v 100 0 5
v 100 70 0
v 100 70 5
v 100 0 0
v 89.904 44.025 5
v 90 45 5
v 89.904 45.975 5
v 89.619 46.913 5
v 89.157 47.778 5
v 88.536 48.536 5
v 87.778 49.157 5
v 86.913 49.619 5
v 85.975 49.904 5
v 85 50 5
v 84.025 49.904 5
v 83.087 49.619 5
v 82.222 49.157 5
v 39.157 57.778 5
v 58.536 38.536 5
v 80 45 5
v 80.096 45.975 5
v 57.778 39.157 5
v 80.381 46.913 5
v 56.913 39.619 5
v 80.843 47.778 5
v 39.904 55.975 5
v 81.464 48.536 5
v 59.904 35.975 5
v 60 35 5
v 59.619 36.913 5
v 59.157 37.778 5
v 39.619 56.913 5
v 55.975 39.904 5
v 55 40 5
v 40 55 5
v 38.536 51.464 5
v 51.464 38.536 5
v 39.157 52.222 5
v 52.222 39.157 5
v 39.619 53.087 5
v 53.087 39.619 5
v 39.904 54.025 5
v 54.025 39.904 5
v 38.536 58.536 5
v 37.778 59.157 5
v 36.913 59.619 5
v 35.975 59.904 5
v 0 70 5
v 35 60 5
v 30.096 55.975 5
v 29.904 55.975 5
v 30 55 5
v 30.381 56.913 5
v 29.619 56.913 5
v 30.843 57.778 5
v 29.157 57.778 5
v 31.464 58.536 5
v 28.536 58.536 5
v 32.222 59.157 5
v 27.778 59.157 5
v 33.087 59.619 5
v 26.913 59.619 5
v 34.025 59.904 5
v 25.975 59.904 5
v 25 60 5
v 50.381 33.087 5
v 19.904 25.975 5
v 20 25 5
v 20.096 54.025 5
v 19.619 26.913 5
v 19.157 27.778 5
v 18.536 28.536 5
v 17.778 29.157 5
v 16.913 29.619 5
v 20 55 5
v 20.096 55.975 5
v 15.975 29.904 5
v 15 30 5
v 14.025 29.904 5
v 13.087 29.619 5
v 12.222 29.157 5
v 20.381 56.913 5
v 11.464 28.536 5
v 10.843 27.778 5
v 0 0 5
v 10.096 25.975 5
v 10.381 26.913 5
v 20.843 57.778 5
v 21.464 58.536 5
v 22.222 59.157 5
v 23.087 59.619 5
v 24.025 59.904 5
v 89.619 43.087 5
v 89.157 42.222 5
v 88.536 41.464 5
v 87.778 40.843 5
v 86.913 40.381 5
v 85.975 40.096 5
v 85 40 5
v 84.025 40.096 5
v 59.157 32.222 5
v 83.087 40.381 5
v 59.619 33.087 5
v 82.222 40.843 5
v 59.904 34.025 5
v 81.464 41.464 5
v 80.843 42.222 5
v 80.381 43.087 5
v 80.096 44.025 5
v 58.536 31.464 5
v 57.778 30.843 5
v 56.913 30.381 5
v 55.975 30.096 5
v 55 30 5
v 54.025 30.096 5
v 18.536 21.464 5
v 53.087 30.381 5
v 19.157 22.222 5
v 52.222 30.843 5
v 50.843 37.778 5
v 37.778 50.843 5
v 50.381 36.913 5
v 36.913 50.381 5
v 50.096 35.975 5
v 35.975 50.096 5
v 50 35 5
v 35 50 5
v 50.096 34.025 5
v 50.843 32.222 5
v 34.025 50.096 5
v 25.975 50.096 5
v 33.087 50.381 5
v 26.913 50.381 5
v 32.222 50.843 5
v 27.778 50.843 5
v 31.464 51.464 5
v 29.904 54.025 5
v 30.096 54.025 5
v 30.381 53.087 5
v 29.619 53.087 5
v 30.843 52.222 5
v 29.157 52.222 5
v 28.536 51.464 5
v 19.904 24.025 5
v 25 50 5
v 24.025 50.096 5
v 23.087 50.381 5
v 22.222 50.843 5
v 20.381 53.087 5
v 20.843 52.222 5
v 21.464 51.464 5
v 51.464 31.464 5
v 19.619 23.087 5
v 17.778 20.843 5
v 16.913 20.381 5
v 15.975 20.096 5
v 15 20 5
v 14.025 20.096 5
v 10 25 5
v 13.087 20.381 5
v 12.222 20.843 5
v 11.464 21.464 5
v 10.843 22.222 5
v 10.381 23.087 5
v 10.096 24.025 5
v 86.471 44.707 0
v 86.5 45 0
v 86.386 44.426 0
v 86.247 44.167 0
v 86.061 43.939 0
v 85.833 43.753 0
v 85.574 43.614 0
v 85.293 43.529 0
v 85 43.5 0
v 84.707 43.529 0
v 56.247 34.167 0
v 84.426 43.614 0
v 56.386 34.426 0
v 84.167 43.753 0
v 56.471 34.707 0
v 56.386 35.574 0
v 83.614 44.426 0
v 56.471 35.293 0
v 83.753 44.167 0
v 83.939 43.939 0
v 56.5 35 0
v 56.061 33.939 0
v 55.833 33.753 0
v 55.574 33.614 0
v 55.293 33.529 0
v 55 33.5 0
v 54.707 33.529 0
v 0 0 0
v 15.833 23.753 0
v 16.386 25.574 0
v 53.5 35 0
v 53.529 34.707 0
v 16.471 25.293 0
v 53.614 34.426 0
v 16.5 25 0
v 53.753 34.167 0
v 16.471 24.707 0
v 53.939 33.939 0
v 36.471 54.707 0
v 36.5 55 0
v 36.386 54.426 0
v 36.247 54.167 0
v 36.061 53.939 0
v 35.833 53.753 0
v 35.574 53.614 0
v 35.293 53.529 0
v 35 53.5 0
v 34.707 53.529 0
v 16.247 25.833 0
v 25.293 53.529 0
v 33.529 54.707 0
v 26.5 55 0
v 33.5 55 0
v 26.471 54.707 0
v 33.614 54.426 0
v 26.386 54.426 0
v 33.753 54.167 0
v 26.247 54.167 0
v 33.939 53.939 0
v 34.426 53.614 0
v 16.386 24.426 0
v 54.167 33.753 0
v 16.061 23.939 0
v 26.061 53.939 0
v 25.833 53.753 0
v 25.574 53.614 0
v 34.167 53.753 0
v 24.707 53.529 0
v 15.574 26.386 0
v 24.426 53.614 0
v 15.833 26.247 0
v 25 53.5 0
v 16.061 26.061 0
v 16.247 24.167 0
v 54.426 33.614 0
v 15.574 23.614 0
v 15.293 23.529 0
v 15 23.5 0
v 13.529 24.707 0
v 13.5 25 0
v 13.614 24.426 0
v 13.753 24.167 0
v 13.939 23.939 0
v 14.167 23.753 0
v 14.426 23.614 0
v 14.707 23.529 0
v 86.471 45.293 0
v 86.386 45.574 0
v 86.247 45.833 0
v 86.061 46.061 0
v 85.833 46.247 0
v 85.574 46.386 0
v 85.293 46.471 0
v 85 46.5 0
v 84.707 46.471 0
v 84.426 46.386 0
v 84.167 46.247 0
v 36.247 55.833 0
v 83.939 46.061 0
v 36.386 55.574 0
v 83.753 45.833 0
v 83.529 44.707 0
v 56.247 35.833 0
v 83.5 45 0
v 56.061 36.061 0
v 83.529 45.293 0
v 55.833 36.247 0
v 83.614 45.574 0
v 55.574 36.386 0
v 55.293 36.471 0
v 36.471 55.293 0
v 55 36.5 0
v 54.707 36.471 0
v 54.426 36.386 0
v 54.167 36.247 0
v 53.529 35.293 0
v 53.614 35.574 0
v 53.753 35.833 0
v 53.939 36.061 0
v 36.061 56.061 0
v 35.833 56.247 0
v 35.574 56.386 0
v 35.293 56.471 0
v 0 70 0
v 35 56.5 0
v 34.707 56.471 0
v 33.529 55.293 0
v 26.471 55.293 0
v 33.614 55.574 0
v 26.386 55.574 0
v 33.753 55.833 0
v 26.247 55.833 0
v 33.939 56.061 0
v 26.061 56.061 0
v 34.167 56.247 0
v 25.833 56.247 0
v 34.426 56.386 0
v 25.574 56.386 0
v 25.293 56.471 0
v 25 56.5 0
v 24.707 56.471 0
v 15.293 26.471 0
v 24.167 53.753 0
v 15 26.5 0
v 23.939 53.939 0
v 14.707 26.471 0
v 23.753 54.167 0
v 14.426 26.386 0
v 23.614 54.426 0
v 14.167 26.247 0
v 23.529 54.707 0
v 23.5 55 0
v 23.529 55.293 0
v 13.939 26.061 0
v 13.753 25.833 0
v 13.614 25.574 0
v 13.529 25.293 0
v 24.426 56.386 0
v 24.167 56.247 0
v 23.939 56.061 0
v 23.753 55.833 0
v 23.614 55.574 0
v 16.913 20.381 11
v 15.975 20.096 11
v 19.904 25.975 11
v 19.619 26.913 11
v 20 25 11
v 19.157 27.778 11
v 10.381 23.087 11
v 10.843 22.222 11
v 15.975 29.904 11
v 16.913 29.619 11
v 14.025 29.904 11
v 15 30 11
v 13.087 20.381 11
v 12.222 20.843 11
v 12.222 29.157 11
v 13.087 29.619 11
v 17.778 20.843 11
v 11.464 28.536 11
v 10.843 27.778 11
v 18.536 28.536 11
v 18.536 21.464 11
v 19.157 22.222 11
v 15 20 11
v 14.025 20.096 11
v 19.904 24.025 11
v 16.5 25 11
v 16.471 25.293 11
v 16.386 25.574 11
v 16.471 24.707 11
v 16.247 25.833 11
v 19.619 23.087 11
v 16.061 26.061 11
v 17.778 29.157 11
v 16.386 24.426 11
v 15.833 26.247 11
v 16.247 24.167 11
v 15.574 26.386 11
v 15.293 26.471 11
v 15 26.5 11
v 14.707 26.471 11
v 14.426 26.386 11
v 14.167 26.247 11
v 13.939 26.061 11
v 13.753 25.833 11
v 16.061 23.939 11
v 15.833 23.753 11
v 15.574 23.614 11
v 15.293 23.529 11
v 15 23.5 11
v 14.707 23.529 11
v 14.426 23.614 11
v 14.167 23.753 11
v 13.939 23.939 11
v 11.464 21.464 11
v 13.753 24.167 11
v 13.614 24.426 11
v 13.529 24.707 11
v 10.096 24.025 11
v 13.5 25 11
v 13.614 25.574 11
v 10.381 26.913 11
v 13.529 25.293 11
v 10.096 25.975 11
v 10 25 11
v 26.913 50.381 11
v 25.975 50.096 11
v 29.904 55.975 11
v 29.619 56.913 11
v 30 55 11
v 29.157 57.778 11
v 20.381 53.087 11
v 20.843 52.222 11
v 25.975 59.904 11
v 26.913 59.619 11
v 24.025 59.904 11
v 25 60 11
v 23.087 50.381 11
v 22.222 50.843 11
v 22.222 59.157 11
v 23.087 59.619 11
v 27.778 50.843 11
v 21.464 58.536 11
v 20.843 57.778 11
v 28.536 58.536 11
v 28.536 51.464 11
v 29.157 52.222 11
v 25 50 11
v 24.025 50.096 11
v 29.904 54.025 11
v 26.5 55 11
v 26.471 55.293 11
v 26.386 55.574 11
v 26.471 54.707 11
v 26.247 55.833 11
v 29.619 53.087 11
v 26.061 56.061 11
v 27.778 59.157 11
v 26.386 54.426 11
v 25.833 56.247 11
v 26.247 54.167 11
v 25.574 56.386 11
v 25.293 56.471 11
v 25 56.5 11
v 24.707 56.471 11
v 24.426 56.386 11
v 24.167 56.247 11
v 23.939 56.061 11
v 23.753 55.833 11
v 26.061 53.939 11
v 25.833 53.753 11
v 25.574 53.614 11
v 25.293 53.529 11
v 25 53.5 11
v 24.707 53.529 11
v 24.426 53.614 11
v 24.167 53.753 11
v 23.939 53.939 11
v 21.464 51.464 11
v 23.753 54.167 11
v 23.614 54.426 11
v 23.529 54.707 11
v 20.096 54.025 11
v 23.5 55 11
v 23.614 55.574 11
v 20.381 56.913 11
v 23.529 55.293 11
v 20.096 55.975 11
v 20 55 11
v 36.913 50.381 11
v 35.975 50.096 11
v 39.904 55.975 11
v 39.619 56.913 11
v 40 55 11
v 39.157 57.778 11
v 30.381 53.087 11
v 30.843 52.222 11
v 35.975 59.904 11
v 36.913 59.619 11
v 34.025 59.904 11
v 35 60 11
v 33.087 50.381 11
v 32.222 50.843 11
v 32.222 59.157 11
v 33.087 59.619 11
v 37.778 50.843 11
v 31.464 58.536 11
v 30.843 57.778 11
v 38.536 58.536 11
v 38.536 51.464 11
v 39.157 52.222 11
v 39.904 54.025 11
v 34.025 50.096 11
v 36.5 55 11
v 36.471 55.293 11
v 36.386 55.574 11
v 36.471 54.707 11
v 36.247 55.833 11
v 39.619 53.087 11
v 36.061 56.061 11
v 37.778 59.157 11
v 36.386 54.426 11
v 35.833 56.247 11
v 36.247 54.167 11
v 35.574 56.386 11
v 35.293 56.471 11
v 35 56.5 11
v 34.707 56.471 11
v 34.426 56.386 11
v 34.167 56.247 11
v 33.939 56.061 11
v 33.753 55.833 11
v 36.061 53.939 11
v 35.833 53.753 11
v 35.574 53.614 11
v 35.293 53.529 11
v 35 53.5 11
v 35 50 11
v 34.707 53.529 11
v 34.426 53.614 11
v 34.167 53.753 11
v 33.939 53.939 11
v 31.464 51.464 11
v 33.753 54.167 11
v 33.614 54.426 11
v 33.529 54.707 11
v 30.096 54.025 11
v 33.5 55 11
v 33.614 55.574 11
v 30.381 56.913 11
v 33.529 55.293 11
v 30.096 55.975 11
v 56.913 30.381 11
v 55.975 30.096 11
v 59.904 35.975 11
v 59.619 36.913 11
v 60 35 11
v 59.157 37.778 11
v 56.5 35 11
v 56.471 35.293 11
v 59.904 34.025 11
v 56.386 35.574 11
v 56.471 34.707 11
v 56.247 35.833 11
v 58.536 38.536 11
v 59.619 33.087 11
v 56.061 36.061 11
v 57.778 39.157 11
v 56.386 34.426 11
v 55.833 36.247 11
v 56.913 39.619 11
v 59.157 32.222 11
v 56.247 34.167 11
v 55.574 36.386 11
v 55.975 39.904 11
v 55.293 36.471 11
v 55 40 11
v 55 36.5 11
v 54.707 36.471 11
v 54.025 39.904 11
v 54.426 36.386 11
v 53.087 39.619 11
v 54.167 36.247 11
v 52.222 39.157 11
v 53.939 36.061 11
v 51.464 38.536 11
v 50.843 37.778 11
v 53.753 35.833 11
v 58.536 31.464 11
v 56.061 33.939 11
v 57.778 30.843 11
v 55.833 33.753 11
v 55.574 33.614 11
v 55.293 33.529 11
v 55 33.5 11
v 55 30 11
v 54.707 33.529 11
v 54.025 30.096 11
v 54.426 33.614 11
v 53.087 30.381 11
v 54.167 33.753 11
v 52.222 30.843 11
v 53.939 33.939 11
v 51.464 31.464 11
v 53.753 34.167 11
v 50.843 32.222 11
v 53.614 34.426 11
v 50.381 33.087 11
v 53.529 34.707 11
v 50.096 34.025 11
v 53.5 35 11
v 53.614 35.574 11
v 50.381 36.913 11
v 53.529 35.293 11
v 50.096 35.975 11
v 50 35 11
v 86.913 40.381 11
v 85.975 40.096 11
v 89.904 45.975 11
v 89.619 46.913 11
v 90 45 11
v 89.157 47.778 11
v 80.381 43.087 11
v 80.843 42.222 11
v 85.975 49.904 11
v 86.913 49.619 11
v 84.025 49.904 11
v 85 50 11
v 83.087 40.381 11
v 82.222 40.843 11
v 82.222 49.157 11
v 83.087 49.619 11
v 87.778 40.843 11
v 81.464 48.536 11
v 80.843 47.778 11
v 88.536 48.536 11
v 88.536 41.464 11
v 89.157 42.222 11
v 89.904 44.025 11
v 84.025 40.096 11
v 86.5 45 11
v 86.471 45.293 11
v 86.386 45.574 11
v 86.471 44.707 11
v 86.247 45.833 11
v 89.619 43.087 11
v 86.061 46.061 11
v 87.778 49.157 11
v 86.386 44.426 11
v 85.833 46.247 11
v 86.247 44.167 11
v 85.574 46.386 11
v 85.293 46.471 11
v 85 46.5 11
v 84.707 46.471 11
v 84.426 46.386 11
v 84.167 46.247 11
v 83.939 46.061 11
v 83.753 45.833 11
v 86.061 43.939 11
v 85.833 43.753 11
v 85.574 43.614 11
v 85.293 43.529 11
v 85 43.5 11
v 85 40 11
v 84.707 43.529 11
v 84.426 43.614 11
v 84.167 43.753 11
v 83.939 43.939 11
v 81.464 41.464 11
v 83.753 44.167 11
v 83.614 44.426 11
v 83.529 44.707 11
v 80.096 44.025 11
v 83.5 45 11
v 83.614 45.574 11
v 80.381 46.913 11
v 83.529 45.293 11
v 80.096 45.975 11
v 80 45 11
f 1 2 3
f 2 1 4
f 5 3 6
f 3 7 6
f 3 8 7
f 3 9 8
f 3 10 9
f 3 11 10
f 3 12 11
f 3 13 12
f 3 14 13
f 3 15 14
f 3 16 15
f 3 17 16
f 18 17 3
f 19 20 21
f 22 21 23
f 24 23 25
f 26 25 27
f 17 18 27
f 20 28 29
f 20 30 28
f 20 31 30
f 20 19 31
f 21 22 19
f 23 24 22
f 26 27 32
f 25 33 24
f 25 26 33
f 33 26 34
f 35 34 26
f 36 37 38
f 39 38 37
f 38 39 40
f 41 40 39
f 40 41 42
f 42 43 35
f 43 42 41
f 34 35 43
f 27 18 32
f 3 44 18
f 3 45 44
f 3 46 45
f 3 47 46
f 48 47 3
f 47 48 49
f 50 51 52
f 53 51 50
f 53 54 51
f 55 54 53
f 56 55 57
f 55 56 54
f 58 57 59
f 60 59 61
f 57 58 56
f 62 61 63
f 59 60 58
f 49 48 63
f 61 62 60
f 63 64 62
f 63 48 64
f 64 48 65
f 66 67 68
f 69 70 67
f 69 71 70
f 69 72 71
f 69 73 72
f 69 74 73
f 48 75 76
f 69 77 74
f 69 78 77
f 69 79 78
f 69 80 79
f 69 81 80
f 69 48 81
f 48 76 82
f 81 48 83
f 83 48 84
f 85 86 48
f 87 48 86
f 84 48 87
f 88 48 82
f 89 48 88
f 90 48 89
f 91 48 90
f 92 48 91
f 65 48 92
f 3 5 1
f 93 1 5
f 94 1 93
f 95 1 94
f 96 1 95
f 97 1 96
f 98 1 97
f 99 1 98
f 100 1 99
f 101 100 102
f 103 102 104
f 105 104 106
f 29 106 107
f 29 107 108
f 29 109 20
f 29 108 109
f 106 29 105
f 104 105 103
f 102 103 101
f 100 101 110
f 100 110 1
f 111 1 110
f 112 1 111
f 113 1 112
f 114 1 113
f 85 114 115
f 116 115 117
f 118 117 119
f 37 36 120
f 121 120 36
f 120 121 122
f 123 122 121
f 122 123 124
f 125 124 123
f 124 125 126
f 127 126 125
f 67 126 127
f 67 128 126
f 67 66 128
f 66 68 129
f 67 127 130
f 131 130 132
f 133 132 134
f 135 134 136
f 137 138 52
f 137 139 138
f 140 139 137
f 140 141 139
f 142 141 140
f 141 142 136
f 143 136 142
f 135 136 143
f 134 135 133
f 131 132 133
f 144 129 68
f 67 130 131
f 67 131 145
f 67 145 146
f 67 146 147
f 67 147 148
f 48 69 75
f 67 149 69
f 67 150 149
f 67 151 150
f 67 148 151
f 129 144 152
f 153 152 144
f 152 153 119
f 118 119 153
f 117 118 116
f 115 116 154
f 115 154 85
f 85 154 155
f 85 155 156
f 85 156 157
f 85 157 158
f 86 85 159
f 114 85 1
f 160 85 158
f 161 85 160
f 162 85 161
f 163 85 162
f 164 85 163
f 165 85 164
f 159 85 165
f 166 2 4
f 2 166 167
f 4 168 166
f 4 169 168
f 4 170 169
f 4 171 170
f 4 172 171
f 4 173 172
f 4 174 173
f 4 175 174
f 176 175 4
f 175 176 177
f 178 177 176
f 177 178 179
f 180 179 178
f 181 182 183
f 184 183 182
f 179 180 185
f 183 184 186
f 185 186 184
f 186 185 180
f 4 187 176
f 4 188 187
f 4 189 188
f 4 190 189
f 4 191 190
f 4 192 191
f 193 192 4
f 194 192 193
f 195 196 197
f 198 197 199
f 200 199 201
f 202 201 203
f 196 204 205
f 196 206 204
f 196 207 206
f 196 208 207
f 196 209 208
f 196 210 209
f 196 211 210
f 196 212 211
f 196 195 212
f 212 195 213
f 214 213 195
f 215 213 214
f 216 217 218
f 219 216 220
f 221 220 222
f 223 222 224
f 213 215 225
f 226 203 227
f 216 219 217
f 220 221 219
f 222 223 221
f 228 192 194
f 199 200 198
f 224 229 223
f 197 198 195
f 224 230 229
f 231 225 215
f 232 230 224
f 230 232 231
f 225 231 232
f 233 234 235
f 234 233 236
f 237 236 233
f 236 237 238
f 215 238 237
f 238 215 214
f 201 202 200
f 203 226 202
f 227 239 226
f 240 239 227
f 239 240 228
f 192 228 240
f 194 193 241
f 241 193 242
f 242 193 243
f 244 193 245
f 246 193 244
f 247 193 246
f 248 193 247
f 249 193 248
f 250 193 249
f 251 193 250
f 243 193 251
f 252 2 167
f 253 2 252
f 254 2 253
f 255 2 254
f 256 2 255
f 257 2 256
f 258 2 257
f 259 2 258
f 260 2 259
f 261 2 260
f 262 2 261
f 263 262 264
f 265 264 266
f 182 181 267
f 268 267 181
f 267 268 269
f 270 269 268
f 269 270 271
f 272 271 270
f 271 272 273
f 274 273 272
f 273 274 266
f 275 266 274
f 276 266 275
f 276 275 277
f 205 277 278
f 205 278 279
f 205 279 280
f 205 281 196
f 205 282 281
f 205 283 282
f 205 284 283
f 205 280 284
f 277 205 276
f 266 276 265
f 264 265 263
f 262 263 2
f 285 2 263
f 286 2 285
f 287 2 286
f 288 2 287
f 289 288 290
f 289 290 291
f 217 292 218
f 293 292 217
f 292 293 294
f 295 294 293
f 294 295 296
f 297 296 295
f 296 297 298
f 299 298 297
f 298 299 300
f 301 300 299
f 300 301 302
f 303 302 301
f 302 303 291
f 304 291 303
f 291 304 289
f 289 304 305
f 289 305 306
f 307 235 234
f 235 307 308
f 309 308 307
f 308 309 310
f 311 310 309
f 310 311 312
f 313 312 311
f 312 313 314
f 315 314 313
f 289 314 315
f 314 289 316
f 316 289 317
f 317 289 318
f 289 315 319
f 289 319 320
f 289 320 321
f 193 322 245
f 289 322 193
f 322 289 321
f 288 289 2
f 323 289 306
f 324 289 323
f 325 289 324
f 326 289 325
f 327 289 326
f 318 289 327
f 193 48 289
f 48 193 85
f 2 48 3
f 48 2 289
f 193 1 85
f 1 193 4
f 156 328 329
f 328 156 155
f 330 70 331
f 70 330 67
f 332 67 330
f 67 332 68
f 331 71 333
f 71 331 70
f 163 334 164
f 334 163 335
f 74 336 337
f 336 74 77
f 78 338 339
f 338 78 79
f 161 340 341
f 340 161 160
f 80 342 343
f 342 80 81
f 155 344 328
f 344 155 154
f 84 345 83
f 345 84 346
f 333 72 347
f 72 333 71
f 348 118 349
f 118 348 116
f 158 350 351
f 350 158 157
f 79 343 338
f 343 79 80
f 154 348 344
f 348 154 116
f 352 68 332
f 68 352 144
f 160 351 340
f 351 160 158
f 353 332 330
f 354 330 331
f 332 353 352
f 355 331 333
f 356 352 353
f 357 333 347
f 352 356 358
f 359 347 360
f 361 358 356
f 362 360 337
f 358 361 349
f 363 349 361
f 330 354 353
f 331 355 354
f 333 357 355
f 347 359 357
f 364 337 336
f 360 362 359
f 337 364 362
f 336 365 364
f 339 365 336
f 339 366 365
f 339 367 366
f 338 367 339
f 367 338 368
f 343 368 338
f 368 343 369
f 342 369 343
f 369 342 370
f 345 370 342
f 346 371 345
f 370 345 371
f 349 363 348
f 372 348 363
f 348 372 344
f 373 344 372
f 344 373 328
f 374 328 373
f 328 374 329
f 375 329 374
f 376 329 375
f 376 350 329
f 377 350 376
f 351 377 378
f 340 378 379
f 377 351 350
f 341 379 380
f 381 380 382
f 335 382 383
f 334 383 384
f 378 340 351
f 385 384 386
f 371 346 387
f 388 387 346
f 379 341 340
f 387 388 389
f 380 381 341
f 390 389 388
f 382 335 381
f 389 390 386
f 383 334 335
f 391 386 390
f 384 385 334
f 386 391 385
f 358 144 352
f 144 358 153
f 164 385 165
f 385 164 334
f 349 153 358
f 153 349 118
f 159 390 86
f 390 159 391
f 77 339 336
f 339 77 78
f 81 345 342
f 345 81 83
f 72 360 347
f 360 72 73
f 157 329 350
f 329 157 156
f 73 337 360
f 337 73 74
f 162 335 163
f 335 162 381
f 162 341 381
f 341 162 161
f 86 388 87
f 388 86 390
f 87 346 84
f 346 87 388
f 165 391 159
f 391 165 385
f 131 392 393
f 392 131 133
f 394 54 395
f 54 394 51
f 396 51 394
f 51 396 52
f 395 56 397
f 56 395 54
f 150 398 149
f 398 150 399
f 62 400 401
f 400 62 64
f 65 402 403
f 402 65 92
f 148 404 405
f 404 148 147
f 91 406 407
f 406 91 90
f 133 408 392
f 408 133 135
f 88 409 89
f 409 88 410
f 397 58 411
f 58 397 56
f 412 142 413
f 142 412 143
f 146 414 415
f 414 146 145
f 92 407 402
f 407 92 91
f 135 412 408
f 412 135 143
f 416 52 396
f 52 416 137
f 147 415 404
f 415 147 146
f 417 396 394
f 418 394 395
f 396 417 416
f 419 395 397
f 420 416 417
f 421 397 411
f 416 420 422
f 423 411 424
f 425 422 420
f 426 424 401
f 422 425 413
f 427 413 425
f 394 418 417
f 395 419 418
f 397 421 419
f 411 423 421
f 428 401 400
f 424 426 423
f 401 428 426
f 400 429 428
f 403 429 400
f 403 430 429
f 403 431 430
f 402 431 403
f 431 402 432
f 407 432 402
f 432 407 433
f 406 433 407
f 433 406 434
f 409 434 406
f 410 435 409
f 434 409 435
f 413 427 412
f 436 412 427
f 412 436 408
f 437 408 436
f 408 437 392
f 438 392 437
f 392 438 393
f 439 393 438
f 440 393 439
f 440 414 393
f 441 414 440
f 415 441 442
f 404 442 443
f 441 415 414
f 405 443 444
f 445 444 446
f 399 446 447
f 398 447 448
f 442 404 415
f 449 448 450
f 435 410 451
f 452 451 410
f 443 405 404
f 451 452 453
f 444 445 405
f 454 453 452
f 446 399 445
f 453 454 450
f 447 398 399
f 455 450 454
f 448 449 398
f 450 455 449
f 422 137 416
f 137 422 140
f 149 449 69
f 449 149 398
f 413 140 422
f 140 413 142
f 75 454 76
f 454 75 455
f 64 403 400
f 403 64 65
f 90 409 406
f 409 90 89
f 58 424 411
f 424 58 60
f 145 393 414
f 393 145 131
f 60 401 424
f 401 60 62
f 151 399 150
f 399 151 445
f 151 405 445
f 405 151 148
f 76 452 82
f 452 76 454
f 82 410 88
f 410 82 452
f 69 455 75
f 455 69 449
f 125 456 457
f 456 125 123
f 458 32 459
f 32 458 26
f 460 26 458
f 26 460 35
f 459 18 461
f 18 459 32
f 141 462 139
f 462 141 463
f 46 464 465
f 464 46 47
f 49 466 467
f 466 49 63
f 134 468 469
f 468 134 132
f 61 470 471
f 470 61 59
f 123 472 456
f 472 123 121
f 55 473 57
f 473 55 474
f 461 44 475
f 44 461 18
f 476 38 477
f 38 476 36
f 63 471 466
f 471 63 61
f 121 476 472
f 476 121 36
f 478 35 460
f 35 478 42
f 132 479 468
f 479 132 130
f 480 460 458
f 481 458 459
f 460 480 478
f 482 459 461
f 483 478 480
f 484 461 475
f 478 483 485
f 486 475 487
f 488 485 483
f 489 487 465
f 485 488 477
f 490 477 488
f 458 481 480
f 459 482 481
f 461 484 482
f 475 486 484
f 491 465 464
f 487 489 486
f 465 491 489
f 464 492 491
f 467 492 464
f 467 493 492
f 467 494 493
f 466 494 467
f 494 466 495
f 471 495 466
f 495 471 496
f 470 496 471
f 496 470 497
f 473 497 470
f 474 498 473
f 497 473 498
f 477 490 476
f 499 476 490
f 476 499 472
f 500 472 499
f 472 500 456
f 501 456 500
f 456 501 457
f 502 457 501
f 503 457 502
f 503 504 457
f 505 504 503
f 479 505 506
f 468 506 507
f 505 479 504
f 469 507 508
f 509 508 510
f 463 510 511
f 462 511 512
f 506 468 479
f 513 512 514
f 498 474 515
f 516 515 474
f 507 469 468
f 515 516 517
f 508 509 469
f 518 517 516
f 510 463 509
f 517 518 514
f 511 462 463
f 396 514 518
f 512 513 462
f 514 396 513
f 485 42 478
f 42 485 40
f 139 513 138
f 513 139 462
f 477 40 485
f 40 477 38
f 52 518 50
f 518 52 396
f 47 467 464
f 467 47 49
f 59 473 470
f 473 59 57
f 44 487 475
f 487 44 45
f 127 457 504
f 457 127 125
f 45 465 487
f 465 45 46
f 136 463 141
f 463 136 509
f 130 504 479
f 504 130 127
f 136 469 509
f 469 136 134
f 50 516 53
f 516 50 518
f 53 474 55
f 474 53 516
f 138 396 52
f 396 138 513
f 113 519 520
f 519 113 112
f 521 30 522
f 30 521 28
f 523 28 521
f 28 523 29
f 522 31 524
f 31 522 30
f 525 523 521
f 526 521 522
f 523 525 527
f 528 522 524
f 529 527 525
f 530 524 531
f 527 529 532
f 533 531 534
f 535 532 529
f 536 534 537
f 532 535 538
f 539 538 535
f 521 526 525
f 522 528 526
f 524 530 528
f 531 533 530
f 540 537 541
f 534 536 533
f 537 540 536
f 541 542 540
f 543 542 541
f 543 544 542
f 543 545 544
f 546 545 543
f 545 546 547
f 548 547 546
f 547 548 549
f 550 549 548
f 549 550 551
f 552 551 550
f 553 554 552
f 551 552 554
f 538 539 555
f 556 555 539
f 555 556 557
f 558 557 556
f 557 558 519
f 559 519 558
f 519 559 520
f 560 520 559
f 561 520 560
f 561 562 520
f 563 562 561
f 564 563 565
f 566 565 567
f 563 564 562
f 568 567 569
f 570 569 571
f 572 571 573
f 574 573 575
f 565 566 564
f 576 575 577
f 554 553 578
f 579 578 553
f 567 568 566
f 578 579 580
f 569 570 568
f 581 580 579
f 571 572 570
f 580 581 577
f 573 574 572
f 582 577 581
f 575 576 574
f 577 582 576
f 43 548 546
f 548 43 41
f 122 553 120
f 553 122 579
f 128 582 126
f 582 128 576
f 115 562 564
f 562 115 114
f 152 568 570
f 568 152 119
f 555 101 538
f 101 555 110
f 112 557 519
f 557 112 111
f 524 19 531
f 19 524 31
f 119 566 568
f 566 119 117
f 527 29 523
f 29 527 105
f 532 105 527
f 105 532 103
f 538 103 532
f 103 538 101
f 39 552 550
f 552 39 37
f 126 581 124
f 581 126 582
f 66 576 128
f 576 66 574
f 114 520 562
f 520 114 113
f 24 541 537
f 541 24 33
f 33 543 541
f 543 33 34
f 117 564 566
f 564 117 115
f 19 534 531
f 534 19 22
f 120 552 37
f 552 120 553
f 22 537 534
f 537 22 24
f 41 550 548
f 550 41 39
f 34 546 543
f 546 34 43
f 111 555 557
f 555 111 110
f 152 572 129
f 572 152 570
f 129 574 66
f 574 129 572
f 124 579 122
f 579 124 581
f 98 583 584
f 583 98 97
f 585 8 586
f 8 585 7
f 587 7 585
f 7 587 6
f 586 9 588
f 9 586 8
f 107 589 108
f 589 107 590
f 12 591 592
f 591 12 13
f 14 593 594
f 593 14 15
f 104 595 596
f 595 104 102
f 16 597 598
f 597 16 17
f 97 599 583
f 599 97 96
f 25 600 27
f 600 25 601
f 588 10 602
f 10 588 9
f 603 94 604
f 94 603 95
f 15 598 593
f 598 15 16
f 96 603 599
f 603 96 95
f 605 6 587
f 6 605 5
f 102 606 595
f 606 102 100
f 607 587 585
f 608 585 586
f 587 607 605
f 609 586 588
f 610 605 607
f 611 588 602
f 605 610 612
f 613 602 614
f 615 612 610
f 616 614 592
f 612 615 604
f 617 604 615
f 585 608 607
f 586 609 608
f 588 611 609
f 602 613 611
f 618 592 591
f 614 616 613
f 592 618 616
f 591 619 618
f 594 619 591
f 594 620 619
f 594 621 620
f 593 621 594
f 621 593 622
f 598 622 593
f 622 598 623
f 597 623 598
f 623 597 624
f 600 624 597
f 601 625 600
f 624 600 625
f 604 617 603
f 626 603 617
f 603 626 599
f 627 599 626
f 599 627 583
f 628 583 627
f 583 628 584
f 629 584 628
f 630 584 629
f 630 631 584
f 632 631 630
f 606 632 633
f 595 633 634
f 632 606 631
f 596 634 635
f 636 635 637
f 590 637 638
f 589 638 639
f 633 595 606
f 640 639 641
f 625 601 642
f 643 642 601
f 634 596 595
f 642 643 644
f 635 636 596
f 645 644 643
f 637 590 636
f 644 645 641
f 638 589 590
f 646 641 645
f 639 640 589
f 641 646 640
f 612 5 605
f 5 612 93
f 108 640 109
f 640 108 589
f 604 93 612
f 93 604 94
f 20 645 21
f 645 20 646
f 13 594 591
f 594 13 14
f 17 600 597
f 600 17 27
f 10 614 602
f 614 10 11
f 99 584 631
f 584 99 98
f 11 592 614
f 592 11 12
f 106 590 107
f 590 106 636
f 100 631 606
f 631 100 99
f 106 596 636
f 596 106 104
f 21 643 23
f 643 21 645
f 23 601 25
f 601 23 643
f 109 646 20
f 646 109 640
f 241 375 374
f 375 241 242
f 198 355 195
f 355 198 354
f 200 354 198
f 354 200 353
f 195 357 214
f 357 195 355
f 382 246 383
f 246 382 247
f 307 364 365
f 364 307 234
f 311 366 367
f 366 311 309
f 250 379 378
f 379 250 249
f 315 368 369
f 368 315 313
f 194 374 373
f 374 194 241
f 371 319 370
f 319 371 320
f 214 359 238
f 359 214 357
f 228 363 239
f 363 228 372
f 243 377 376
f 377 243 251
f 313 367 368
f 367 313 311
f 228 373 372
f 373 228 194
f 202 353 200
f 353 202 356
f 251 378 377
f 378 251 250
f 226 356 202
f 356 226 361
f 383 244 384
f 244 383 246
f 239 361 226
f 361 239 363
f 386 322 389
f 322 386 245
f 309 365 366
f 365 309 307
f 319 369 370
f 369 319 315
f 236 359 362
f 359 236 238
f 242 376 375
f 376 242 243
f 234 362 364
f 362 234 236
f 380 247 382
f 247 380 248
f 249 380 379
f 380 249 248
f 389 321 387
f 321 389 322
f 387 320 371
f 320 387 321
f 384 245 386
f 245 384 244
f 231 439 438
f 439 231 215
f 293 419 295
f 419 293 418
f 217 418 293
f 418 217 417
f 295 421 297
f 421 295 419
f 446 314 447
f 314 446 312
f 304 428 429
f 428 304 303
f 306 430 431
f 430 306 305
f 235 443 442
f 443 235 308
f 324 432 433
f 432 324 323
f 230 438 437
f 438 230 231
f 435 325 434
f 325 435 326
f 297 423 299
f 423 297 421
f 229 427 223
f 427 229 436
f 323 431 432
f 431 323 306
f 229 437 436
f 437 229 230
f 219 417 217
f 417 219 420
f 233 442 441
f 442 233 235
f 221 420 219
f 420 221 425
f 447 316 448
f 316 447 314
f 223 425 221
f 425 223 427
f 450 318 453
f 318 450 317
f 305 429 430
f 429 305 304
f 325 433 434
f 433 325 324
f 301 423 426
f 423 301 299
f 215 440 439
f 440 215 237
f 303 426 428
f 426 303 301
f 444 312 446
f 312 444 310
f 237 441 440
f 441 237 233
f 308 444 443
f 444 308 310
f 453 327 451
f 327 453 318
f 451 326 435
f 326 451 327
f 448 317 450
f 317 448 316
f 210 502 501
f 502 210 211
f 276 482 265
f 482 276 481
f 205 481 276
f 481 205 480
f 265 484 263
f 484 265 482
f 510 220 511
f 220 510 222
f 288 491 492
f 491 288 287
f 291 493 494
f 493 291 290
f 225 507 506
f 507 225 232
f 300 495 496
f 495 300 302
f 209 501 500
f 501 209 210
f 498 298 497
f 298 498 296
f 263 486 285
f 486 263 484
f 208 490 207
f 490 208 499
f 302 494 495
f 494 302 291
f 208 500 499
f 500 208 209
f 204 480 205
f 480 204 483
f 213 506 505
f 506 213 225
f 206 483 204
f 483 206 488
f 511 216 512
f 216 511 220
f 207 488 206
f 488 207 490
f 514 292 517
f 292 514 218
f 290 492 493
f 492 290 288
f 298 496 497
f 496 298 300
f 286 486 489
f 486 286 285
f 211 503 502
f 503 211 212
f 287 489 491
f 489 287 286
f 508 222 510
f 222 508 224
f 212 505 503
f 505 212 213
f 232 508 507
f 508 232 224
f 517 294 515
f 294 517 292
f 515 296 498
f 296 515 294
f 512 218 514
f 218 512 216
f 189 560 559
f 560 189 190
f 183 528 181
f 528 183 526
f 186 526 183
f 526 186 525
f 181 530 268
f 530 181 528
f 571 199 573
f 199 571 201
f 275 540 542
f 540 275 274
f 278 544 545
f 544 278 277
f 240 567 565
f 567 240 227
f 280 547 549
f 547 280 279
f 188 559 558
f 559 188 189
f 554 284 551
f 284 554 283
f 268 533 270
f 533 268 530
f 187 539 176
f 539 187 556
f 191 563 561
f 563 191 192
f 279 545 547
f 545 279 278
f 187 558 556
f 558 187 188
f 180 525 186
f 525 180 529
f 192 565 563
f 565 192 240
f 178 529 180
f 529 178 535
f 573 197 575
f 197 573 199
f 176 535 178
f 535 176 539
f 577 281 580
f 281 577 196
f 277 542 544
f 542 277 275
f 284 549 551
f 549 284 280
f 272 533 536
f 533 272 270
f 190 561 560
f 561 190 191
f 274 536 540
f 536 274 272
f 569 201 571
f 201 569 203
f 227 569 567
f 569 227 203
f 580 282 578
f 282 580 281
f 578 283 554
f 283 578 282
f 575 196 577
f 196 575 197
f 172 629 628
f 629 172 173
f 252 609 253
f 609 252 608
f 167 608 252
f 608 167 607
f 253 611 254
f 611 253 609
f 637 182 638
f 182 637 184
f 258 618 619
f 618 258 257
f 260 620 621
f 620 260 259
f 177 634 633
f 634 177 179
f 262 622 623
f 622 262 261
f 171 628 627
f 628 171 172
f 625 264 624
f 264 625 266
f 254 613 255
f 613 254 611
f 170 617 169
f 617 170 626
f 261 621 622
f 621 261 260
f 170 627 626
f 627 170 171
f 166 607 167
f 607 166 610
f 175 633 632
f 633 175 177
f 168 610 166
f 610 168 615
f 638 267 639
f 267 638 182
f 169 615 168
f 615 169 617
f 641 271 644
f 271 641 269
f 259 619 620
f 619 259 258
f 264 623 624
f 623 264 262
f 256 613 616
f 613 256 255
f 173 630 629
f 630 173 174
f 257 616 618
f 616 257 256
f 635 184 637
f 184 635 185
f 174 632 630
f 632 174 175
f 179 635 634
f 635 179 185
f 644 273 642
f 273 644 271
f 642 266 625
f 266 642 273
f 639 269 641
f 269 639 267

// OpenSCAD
$fn = 32;

// ----------------------------------------------------------------------
// Boss field: plate with bosses at given coordinates
// ----------------------------------------------------------------------

// --- parameters (mm) ---
plate_l = 100;            // plate length, X
plate_w = 70;             // plate width, Y
plate_t = 5;              // plate thickness, Z
boss_d = 10;              // boss diameter
boss_h = 6;               // boss height above the plate
bore_d = 3;               // boss bore

total_h = plate_t + boss_h;  // overall height

difference() {
  union() {
    cube([plate_l, plate_w, plate_t]);
    translate([15, 25, plate_t]) cylinder(h = boss_h, d = boss_d);
    translate([25, 55, plate_t]) cylinder(h = boss_h, d = boss_d);
    translate([35, 55, plate_t]) cylinder(h = boss_h, d = boss_d);
    translate([55, 35, plate_t]) cylinder(h = boss_h, d = boss_d);
    translate([85, 45, plate_t]) cylinder(h = boss_h, d = boss_d);
  }
  translate([15, 25, -1]) cylinder(h = total_h + 2, d = bore_d);
  translate([25, 55, -1]) cylinder(h = total_h + 2, d = bore_d);
  translate([35, 55, -1]) cylinder(h = total_h + 2, d = bore_d);
  translate([55, 35, -1]) cylinder(h = total_h + 2, d = bore_d);
  translate([85, 45, -1]) cylinder(h = total_h + 2, d = bore_d);
}
